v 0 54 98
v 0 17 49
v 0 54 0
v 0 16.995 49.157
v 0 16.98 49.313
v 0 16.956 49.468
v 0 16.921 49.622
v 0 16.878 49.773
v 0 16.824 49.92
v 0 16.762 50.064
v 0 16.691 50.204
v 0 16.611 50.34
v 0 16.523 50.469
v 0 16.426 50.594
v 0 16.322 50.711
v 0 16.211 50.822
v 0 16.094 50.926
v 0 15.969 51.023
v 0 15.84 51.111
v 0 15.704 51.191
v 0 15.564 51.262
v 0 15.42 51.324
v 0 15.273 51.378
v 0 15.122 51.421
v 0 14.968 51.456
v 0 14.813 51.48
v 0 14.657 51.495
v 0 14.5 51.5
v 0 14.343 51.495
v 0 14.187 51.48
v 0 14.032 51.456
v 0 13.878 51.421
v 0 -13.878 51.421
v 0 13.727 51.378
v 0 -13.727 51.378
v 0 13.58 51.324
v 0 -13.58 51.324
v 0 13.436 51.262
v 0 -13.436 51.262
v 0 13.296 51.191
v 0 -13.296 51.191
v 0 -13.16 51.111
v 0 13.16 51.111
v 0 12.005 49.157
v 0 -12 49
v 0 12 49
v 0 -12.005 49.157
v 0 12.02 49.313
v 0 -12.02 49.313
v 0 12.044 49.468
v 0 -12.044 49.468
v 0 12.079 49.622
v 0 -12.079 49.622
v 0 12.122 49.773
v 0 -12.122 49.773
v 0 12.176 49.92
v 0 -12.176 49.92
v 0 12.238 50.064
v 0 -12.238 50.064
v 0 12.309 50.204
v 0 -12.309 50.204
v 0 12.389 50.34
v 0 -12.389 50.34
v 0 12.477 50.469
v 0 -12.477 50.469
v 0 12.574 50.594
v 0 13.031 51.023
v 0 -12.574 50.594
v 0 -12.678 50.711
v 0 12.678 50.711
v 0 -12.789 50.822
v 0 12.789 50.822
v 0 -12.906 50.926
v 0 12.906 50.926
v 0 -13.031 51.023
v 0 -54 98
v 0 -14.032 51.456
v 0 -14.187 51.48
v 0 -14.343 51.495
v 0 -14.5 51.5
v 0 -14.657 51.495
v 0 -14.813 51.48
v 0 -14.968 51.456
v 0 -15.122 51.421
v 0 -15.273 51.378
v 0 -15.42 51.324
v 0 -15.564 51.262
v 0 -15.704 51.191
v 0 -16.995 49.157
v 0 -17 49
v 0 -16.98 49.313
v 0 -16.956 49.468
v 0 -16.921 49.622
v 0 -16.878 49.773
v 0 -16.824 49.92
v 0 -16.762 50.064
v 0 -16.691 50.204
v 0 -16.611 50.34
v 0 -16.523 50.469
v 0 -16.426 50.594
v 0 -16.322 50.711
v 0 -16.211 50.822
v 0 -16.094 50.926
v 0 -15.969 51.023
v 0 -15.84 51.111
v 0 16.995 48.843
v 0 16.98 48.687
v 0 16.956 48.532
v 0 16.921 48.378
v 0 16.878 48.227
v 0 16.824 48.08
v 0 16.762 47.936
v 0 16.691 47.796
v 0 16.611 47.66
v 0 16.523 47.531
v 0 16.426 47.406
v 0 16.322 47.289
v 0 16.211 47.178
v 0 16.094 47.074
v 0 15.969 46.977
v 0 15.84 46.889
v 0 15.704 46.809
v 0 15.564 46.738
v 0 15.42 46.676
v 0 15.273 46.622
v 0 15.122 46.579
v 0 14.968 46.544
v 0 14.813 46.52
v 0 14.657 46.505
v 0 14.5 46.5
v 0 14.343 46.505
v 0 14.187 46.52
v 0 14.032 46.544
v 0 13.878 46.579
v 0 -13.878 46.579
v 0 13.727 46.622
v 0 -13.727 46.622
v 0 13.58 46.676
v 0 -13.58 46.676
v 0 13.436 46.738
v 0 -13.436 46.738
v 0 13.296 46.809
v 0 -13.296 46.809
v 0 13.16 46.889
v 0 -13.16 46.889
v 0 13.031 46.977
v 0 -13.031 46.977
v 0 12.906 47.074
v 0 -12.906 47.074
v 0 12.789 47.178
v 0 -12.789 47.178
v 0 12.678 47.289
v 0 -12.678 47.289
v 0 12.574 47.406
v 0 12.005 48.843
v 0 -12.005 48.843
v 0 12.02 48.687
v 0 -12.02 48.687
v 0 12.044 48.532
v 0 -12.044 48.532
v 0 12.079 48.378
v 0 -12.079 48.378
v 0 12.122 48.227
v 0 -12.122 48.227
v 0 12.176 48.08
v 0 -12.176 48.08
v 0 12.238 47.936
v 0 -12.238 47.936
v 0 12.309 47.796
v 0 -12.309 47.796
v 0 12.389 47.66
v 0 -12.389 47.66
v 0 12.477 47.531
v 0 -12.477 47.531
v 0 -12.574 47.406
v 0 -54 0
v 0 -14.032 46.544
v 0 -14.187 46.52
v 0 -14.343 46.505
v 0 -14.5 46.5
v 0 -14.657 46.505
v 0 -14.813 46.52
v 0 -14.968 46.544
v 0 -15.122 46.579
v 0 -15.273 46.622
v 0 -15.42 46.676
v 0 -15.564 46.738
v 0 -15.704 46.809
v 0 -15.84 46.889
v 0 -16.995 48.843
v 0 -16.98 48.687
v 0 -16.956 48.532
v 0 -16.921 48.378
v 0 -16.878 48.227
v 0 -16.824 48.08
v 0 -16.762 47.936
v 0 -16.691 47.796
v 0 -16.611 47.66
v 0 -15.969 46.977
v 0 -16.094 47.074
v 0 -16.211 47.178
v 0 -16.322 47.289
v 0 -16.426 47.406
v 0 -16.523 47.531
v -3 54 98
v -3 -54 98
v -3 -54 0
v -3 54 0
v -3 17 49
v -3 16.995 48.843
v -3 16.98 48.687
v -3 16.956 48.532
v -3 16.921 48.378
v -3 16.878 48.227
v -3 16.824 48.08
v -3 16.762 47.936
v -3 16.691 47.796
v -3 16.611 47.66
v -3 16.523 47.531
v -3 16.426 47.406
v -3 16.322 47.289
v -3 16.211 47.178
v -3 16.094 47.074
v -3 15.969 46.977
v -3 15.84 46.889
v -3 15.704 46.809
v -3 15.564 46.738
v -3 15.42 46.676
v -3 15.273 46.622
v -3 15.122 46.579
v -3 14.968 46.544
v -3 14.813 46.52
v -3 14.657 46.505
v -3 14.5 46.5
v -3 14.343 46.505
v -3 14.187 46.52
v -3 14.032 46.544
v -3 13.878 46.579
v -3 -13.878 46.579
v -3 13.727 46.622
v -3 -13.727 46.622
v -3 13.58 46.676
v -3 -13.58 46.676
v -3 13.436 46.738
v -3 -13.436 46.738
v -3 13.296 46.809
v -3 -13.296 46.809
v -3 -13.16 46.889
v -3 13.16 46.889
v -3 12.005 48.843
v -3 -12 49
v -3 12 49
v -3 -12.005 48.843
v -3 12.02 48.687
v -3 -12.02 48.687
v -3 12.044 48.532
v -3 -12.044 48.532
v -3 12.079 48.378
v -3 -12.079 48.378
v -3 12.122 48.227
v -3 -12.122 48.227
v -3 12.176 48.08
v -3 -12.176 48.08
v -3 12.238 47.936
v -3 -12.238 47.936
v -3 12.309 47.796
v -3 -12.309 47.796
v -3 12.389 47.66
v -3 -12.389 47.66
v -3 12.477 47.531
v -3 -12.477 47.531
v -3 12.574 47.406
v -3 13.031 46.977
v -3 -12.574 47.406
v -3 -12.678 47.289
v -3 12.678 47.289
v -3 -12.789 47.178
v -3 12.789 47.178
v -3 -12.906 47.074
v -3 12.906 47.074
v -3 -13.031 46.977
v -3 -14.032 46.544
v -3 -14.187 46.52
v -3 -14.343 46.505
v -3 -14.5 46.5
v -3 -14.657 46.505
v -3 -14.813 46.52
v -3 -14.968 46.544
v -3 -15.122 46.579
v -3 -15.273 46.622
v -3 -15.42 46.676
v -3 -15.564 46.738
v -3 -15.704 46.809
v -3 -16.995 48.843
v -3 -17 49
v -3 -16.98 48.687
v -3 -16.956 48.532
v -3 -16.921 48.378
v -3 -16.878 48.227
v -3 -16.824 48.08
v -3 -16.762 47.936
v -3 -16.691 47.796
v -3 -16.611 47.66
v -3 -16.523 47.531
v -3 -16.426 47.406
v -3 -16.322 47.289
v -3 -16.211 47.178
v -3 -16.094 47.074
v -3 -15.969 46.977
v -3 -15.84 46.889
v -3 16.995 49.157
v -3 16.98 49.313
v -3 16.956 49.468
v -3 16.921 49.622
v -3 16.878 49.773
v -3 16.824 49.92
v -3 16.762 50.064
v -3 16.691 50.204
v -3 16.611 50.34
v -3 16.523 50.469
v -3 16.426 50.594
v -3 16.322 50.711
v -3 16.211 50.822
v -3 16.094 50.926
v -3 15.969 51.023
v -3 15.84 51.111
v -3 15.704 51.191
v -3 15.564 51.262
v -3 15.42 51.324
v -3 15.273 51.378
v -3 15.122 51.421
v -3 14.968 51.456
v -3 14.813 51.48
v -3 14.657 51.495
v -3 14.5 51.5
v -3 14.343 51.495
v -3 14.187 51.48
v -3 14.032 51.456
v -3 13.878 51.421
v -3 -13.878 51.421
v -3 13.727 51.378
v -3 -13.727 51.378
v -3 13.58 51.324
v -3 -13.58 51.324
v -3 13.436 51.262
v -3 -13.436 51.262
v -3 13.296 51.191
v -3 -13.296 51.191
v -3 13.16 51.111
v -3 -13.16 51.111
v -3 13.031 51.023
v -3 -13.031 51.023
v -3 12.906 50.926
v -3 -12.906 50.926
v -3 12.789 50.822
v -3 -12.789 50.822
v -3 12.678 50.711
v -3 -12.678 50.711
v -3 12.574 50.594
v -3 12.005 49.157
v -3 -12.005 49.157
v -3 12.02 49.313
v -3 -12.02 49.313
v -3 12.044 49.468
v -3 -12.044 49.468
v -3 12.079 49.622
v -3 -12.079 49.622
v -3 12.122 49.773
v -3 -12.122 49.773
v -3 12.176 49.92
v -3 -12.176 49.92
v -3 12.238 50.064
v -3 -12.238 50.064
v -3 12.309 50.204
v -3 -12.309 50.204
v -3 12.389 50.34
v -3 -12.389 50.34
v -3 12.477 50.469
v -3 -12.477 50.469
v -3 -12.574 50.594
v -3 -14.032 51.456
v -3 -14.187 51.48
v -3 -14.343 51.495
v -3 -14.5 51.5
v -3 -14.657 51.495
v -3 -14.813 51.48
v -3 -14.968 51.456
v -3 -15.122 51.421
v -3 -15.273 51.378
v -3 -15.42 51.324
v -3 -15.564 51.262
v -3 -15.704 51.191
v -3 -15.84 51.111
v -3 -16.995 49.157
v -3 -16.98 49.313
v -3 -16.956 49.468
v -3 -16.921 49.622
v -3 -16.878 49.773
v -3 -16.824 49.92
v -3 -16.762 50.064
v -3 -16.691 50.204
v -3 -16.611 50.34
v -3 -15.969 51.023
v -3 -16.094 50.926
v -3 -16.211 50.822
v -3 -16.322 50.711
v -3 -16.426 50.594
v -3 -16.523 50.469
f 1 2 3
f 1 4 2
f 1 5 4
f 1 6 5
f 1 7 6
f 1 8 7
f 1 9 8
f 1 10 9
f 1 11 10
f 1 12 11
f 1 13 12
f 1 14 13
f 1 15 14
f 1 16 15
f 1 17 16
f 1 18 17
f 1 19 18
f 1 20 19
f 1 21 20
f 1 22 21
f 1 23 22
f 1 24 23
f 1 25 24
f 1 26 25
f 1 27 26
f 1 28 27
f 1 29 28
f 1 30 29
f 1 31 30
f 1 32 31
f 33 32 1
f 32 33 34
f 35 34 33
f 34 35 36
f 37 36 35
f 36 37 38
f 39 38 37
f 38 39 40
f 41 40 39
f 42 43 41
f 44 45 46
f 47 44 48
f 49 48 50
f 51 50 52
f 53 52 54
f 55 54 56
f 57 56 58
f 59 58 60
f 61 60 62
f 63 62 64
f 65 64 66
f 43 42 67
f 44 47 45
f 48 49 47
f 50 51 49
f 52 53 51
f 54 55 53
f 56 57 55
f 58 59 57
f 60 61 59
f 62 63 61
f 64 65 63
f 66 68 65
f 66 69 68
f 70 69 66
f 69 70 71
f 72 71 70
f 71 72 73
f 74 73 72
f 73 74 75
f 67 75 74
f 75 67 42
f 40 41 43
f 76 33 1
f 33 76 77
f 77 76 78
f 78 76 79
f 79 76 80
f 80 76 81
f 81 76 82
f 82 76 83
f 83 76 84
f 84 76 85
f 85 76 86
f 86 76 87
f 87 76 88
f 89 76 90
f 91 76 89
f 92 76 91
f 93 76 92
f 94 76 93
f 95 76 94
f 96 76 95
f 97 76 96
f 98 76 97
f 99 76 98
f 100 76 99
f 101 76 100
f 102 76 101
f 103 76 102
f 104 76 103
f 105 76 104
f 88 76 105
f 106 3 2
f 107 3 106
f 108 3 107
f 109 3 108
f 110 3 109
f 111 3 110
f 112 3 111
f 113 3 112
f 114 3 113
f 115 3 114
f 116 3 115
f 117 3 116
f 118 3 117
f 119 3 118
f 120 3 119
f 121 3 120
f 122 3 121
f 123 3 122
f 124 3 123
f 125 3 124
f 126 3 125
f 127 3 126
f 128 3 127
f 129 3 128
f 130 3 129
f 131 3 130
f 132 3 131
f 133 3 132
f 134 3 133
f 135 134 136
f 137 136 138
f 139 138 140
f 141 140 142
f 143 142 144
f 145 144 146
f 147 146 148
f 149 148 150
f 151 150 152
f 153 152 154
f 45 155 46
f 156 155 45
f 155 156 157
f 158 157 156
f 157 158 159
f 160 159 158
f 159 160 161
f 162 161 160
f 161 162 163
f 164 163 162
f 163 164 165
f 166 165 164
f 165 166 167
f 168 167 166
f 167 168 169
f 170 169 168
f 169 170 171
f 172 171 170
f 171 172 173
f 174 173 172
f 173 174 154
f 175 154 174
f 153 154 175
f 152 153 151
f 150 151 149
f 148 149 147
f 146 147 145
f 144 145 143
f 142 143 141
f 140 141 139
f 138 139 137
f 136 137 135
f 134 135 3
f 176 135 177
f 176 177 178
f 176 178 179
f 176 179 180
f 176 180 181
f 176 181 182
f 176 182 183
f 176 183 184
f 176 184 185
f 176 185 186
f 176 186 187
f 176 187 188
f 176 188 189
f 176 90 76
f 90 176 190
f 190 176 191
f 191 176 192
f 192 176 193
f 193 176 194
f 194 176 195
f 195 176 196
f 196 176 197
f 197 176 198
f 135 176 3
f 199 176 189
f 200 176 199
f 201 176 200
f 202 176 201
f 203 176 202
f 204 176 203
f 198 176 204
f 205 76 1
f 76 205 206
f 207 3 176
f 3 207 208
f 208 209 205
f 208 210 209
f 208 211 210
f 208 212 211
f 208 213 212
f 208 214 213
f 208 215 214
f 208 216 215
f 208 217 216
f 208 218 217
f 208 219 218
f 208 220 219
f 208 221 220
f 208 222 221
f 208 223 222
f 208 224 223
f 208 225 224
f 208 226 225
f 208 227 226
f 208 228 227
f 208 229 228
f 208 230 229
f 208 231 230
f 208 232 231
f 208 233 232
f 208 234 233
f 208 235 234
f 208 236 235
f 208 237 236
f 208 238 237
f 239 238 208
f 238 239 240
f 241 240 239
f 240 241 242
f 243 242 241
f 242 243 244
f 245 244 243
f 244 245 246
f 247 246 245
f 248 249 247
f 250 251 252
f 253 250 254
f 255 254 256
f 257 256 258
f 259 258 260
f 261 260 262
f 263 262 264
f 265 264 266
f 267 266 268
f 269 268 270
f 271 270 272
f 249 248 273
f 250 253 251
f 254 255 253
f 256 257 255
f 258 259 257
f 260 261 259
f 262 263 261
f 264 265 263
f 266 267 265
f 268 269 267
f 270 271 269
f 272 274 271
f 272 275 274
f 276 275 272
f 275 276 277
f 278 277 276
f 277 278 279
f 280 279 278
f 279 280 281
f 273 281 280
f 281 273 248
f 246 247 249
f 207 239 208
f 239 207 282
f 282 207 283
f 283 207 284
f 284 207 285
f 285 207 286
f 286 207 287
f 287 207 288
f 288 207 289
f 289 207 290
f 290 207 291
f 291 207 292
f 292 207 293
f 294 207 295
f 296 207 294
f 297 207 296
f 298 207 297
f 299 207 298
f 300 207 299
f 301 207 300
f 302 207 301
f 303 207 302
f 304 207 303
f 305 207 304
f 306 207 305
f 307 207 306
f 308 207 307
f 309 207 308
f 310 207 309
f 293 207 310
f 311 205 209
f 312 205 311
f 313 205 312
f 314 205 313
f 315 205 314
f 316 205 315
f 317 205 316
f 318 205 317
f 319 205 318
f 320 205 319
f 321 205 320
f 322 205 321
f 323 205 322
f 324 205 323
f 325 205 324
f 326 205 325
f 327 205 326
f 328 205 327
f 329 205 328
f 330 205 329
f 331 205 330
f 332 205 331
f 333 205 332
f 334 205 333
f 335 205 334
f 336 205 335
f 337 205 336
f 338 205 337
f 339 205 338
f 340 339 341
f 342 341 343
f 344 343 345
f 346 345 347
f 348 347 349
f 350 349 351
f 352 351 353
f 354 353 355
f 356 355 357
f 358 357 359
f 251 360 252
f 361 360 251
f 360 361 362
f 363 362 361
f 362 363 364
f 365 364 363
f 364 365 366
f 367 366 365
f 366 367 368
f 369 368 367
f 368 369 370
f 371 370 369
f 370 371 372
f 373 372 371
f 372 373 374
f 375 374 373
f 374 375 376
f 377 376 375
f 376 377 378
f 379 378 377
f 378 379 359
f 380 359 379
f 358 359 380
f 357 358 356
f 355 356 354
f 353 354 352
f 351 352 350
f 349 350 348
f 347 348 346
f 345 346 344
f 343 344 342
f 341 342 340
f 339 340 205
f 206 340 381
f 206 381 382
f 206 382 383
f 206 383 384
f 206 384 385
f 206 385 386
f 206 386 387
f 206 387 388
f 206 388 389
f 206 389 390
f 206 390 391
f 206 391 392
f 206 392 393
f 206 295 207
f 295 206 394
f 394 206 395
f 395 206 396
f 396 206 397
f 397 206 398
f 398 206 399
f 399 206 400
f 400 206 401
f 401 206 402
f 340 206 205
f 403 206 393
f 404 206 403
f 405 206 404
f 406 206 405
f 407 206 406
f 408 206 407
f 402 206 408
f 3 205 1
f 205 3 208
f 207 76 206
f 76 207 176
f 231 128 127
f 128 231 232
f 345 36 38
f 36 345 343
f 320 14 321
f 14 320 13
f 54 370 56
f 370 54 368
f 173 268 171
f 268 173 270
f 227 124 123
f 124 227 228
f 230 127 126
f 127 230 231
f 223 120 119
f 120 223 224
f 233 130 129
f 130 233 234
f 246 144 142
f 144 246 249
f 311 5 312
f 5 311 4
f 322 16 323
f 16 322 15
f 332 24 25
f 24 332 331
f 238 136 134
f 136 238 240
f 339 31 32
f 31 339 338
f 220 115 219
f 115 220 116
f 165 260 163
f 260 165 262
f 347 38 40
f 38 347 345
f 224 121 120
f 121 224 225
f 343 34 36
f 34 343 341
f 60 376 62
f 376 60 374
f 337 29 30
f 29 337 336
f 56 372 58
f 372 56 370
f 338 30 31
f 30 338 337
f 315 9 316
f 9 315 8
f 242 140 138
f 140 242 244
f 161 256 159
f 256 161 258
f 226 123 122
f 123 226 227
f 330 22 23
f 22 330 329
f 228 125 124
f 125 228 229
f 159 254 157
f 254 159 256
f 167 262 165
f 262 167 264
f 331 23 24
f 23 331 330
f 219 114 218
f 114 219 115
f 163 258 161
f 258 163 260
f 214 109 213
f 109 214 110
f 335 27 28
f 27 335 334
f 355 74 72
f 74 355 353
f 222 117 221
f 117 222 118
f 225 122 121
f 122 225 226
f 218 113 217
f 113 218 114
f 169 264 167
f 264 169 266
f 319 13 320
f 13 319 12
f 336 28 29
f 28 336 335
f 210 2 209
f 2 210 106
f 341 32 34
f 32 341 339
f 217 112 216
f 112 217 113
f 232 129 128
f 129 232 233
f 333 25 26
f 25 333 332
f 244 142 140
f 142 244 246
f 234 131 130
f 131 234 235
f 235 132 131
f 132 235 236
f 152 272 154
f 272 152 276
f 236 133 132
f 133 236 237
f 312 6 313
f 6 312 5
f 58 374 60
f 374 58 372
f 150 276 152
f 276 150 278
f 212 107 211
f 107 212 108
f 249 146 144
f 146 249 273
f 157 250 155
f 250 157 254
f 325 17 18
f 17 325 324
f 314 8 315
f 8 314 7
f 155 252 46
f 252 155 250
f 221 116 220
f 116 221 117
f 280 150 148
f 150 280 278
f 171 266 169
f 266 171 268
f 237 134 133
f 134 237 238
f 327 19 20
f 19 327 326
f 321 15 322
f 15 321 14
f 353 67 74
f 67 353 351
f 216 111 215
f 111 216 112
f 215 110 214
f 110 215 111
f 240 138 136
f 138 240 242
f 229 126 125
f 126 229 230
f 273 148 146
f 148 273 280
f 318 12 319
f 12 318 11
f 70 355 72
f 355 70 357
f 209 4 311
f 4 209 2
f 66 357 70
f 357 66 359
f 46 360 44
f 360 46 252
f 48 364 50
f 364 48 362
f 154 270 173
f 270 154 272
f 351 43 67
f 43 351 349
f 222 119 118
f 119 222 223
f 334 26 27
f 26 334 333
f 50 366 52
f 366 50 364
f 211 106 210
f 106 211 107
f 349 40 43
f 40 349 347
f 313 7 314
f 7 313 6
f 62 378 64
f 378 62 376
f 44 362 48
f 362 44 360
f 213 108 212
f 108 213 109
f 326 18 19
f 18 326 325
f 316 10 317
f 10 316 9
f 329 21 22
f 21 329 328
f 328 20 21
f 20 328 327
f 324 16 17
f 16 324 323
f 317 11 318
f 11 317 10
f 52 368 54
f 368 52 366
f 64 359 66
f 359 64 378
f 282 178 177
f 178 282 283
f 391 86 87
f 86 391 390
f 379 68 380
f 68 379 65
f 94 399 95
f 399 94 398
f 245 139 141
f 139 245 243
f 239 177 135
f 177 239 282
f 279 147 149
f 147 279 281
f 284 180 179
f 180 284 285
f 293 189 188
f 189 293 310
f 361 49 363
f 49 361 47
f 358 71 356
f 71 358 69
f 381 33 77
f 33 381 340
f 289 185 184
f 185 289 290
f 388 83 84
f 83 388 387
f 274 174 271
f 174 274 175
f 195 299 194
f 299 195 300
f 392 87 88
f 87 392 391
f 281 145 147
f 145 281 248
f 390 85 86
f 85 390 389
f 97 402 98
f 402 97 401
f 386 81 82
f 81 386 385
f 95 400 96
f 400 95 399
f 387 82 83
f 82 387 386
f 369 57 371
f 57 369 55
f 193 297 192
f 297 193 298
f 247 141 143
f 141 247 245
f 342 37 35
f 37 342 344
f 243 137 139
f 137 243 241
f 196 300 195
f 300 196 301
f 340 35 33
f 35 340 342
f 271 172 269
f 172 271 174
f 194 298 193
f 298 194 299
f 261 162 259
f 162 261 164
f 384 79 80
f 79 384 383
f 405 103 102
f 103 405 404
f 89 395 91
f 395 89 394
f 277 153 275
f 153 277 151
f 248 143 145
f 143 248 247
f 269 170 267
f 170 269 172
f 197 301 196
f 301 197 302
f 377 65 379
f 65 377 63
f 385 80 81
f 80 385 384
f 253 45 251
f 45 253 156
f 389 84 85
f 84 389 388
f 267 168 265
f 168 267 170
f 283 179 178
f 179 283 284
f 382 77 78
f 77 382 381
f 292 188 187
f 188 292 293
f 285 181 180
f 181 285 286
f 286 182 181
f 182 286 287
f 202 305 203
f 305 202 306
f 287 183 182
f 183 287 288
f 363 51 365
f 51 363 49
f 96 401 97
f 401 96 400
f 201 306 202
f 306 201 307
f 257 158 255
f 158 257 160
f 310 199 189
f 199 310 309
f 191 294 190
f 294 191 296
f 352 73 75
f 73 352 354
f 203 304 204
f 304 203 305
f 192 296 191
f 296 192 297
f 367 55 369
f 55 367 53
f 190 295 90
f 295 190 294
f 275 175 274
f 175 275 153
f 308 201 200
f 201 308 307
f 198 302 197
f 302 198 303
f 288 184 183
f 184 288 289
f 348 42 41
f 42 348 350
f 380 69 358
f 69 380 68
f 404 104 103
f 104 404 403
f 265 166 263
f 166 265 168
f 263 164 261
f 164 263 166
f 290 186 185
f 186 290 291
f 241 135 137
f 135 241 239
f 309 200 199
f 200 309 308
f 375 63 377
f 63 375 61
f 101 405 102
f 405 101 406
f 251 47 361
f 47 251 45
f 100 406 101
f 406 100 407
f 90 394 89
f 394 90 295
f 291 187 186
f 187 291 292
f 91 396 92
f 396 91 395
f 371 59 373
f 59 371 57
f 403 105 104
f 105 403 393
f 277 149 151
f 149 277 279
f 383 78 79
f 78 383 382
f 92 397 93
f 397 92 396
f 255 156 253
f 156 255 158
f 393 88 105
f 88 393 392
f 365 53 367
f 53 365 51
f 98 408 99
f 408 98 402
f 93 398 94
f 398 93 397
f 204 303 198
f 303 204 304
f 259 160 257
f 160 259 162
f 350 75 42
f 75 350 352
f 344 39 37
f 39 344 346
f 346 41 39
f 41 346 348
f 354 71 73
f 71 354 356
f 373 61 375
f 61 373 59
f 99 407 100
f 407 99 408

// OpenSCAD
z_plate();

module z_plate() {
    translate([-3,-108/2,0]) {
        difference() {
            cube([3,108,98]);
            translate([0,108/2+29/2,98/2]) rotate([0,90,0]) cylinder(r=5/2,h=10,center=true,$fn=100);
            translate([0,108/2-29/2,98/2]) rotate([0,90,0]) cylinder(r=5/2,h=10,center=true,$fn=100);
            
        }
    }
}
